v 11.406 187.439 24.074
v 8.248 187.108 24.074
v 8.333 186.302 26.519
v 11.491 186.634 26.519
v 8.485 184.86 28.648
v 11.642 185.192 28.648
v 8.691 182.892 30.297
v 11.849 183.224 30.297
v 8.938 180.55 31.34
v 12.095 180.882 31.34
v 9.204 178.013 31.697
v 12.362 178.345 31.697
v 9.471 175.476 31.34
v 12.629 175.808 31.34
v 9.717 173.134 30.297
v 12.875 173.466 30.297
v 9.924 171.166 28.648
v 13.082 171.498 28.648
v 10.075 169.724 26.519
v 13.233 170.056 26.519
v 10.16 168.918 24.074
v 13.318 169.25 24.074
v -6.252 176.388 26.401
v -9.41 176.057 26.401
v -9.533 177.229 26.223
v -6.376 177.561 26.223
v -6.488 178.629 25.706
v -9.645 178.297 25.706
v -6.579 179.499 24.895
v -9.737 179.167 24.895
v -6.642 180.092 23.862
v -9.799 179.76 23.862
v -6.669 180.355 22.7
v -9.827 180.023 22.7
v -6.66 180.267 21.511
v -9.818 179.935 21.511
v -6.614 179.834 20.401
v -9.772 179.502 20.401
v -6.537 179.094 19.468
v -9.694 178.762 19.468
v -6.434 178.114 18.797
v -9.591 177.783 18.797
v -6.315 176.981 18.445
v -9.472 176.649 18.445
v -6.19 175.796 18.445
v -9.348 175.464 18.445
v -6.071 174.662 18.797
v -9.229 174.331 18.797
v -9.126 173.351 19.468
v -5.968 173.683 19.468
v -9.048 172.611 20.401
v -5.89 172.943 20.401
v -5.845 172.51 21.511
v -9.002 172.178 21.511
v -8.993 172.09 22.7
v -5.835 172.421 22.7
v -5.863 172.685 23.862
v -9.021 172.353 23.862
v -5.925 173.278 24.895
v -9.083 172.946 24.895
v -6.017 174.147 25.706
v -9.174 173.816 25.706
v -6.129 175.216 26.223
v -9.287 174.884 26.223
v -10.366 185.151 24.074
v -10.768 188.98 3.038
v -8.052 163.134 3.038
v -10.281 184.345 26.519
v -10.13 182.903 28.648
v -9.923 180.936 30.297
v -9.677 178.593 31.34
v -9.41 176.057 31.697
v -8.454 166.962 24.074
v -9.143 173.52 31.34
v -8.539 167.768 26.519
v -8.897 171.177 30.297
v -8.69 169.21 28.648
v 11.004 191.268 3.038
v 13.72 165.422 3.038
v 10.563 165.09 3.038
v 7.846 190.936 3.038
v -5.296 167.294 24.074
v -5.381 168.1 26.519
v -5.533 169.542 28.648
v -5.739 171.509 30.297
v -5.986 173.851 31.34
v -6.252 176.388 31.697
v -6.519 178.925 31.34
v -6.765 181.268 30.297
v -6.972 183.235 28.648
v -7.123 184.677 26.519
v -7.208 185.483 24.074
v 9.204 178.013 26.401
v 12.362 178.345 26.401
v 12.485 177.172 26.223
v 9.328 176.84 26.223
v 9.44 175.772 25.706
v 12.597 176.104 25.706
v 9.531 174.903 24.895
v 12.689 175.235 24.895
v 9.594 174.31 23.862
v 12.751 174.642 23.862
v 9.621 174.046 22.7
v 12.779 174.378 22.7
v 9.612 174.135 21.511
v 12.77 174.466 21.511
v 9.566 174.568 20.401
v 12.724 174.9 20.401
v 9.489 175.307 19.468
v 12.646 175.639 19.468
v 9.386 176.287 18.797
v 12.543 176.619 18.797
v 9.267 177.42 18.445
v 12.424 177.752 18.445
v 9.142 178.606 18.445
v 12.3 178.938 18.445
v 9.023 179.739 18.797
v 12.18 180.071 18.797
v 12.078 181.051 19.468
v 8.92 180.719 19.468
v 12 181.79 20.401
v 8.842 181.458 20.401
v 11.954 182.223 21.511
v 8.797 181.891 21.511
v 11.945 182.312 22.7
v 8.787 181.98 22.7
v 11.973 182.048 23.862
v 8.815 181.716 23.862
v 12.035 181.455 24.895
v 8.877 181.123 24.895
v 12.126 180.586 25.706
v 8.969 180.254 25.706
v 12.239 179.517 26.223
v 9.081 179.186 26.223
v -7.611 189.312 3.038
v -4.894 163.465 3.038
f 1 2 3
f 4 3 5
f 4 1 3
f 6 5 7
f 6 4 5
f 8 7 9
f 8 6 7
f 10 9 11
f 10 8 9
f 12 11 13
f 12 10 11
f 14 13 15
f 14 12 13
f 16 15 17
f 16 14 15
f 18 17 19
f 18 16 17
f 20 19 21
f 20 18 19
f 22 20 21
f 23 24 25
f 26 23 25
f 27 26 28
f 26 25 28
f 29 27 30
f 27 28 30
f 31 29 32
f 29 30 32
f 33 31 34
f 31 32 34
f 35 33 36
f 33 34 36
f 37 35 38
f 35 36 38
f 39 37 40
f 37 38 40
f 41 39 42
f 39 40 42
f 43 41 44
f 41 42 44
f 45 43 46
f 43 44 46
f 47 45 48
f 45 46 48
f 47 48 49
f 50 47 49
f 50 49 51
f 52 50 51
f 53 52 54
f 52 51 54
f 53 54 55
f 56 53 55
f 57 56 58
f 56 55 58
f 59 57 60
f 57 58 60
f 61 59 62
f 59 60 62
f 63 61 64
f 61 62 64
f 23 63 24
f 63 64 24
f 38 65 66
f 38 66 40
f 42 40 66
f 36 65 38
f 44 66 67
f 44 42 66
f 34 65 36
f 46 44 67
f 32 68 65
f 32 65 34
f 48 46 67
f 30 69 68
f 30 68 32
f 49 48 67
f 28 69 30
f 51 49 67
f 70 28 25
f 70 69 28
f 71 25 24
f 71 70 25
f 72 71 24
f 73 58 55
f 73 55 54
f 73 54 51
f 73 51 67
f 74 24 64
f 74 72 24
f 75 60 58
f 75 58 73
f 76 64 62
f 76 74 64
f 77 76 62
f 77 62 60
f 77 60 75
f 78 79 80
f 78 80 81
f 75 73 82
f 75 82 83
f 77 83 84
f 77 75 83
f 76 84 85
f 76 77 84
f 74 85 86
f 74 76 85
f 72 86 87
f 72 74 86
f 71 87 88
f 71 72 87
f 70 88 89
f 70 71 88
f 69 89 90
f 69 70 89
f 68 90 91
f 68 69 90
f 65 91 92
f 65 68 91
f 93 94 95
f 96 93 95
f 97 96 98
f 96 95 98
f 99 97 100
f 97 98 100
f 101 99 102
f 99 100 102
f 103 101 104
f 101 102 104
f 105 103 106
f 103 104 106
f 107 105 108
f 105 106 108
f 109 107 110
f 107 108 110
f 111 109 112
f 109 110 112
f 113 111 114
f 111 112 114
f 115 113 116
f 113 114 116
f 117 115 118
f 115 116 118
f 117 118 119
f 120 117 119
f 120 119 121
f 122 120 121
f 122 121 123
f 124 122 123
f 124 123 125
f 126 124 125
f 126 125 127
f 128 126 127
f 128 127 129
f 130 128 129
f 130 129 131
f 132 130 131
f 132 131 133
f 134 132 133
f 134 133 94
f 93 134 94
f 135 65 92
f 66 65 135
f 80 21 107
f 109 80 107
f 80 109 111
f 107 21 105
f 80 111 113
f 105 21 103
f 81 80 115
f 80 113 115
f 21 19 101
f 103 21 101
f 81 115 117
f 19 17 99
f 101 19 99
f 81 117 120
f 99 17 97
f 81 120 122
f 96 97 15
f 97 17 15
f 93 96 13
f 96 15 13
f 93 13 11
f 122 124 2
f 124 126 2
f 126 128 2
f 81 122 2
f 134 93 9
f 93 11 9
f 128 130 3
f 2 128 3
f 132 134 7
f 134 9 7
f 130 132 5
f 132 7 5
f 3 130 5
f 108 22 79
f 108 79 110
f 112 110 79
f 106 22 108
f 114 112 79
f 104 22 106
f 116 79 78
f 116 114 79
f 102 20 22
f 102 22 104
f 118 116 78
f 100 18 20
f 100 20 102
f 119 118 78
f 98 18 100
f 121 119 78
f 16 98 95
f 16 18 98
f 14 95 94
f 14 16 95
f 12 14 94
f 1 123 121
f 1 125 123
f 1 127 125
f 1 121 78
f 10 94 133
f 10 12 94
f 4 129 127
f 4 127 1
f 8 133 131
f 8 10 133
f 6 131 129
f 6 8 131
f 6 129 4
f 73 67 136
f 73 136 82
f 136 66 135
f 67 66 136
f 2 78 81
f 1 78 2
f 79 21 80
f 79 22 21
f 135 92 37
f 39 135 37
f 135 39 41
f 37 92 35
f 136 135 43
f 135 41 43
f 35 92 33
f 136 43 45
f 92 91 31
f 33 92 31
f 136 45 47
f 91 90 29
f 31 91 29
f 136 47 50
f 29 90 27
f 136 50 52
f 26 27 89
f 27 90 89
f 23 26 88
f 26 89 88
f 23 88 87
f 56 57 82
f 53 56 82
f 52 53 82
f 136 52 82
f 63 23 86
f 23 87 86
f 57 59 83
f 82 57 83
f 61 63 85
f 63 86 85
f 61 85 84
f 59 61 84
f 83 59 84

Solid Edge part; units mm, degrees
sketch "Sketch1" plane through (7.9323, 11.0564, 10.1667) normal (0.9945, 0.1045, 0) x (0, 0, 1)
  line L0 (13.9073, -175.0537) -> (-7.1287, -178.9033)
  line L1 (-7.1287, -178.9033) -> (-7.1287, -152.9149)
  line L2 (-7.1287, -152.9149) -> (13.9073, -156.7644)
  arc A0 (13.9073, -156.7644) -> (13.9073, -175.0537) centre (12.2339, -165.909) cw
  circle A1 centre (12.2339, -165.909) radius 4
  dimension "D1" = 7.1287
extrude "ExtrudedProtrusion_1" add sketch "Sketch1" along normal blind 3.175
mirror "Mirror1" about plane through (18.8182, 12.2006, 10.1667) normal (0.9945, 0.1045, 0) of "ExtrudedProtrusion_1"
properties material "Steel"
